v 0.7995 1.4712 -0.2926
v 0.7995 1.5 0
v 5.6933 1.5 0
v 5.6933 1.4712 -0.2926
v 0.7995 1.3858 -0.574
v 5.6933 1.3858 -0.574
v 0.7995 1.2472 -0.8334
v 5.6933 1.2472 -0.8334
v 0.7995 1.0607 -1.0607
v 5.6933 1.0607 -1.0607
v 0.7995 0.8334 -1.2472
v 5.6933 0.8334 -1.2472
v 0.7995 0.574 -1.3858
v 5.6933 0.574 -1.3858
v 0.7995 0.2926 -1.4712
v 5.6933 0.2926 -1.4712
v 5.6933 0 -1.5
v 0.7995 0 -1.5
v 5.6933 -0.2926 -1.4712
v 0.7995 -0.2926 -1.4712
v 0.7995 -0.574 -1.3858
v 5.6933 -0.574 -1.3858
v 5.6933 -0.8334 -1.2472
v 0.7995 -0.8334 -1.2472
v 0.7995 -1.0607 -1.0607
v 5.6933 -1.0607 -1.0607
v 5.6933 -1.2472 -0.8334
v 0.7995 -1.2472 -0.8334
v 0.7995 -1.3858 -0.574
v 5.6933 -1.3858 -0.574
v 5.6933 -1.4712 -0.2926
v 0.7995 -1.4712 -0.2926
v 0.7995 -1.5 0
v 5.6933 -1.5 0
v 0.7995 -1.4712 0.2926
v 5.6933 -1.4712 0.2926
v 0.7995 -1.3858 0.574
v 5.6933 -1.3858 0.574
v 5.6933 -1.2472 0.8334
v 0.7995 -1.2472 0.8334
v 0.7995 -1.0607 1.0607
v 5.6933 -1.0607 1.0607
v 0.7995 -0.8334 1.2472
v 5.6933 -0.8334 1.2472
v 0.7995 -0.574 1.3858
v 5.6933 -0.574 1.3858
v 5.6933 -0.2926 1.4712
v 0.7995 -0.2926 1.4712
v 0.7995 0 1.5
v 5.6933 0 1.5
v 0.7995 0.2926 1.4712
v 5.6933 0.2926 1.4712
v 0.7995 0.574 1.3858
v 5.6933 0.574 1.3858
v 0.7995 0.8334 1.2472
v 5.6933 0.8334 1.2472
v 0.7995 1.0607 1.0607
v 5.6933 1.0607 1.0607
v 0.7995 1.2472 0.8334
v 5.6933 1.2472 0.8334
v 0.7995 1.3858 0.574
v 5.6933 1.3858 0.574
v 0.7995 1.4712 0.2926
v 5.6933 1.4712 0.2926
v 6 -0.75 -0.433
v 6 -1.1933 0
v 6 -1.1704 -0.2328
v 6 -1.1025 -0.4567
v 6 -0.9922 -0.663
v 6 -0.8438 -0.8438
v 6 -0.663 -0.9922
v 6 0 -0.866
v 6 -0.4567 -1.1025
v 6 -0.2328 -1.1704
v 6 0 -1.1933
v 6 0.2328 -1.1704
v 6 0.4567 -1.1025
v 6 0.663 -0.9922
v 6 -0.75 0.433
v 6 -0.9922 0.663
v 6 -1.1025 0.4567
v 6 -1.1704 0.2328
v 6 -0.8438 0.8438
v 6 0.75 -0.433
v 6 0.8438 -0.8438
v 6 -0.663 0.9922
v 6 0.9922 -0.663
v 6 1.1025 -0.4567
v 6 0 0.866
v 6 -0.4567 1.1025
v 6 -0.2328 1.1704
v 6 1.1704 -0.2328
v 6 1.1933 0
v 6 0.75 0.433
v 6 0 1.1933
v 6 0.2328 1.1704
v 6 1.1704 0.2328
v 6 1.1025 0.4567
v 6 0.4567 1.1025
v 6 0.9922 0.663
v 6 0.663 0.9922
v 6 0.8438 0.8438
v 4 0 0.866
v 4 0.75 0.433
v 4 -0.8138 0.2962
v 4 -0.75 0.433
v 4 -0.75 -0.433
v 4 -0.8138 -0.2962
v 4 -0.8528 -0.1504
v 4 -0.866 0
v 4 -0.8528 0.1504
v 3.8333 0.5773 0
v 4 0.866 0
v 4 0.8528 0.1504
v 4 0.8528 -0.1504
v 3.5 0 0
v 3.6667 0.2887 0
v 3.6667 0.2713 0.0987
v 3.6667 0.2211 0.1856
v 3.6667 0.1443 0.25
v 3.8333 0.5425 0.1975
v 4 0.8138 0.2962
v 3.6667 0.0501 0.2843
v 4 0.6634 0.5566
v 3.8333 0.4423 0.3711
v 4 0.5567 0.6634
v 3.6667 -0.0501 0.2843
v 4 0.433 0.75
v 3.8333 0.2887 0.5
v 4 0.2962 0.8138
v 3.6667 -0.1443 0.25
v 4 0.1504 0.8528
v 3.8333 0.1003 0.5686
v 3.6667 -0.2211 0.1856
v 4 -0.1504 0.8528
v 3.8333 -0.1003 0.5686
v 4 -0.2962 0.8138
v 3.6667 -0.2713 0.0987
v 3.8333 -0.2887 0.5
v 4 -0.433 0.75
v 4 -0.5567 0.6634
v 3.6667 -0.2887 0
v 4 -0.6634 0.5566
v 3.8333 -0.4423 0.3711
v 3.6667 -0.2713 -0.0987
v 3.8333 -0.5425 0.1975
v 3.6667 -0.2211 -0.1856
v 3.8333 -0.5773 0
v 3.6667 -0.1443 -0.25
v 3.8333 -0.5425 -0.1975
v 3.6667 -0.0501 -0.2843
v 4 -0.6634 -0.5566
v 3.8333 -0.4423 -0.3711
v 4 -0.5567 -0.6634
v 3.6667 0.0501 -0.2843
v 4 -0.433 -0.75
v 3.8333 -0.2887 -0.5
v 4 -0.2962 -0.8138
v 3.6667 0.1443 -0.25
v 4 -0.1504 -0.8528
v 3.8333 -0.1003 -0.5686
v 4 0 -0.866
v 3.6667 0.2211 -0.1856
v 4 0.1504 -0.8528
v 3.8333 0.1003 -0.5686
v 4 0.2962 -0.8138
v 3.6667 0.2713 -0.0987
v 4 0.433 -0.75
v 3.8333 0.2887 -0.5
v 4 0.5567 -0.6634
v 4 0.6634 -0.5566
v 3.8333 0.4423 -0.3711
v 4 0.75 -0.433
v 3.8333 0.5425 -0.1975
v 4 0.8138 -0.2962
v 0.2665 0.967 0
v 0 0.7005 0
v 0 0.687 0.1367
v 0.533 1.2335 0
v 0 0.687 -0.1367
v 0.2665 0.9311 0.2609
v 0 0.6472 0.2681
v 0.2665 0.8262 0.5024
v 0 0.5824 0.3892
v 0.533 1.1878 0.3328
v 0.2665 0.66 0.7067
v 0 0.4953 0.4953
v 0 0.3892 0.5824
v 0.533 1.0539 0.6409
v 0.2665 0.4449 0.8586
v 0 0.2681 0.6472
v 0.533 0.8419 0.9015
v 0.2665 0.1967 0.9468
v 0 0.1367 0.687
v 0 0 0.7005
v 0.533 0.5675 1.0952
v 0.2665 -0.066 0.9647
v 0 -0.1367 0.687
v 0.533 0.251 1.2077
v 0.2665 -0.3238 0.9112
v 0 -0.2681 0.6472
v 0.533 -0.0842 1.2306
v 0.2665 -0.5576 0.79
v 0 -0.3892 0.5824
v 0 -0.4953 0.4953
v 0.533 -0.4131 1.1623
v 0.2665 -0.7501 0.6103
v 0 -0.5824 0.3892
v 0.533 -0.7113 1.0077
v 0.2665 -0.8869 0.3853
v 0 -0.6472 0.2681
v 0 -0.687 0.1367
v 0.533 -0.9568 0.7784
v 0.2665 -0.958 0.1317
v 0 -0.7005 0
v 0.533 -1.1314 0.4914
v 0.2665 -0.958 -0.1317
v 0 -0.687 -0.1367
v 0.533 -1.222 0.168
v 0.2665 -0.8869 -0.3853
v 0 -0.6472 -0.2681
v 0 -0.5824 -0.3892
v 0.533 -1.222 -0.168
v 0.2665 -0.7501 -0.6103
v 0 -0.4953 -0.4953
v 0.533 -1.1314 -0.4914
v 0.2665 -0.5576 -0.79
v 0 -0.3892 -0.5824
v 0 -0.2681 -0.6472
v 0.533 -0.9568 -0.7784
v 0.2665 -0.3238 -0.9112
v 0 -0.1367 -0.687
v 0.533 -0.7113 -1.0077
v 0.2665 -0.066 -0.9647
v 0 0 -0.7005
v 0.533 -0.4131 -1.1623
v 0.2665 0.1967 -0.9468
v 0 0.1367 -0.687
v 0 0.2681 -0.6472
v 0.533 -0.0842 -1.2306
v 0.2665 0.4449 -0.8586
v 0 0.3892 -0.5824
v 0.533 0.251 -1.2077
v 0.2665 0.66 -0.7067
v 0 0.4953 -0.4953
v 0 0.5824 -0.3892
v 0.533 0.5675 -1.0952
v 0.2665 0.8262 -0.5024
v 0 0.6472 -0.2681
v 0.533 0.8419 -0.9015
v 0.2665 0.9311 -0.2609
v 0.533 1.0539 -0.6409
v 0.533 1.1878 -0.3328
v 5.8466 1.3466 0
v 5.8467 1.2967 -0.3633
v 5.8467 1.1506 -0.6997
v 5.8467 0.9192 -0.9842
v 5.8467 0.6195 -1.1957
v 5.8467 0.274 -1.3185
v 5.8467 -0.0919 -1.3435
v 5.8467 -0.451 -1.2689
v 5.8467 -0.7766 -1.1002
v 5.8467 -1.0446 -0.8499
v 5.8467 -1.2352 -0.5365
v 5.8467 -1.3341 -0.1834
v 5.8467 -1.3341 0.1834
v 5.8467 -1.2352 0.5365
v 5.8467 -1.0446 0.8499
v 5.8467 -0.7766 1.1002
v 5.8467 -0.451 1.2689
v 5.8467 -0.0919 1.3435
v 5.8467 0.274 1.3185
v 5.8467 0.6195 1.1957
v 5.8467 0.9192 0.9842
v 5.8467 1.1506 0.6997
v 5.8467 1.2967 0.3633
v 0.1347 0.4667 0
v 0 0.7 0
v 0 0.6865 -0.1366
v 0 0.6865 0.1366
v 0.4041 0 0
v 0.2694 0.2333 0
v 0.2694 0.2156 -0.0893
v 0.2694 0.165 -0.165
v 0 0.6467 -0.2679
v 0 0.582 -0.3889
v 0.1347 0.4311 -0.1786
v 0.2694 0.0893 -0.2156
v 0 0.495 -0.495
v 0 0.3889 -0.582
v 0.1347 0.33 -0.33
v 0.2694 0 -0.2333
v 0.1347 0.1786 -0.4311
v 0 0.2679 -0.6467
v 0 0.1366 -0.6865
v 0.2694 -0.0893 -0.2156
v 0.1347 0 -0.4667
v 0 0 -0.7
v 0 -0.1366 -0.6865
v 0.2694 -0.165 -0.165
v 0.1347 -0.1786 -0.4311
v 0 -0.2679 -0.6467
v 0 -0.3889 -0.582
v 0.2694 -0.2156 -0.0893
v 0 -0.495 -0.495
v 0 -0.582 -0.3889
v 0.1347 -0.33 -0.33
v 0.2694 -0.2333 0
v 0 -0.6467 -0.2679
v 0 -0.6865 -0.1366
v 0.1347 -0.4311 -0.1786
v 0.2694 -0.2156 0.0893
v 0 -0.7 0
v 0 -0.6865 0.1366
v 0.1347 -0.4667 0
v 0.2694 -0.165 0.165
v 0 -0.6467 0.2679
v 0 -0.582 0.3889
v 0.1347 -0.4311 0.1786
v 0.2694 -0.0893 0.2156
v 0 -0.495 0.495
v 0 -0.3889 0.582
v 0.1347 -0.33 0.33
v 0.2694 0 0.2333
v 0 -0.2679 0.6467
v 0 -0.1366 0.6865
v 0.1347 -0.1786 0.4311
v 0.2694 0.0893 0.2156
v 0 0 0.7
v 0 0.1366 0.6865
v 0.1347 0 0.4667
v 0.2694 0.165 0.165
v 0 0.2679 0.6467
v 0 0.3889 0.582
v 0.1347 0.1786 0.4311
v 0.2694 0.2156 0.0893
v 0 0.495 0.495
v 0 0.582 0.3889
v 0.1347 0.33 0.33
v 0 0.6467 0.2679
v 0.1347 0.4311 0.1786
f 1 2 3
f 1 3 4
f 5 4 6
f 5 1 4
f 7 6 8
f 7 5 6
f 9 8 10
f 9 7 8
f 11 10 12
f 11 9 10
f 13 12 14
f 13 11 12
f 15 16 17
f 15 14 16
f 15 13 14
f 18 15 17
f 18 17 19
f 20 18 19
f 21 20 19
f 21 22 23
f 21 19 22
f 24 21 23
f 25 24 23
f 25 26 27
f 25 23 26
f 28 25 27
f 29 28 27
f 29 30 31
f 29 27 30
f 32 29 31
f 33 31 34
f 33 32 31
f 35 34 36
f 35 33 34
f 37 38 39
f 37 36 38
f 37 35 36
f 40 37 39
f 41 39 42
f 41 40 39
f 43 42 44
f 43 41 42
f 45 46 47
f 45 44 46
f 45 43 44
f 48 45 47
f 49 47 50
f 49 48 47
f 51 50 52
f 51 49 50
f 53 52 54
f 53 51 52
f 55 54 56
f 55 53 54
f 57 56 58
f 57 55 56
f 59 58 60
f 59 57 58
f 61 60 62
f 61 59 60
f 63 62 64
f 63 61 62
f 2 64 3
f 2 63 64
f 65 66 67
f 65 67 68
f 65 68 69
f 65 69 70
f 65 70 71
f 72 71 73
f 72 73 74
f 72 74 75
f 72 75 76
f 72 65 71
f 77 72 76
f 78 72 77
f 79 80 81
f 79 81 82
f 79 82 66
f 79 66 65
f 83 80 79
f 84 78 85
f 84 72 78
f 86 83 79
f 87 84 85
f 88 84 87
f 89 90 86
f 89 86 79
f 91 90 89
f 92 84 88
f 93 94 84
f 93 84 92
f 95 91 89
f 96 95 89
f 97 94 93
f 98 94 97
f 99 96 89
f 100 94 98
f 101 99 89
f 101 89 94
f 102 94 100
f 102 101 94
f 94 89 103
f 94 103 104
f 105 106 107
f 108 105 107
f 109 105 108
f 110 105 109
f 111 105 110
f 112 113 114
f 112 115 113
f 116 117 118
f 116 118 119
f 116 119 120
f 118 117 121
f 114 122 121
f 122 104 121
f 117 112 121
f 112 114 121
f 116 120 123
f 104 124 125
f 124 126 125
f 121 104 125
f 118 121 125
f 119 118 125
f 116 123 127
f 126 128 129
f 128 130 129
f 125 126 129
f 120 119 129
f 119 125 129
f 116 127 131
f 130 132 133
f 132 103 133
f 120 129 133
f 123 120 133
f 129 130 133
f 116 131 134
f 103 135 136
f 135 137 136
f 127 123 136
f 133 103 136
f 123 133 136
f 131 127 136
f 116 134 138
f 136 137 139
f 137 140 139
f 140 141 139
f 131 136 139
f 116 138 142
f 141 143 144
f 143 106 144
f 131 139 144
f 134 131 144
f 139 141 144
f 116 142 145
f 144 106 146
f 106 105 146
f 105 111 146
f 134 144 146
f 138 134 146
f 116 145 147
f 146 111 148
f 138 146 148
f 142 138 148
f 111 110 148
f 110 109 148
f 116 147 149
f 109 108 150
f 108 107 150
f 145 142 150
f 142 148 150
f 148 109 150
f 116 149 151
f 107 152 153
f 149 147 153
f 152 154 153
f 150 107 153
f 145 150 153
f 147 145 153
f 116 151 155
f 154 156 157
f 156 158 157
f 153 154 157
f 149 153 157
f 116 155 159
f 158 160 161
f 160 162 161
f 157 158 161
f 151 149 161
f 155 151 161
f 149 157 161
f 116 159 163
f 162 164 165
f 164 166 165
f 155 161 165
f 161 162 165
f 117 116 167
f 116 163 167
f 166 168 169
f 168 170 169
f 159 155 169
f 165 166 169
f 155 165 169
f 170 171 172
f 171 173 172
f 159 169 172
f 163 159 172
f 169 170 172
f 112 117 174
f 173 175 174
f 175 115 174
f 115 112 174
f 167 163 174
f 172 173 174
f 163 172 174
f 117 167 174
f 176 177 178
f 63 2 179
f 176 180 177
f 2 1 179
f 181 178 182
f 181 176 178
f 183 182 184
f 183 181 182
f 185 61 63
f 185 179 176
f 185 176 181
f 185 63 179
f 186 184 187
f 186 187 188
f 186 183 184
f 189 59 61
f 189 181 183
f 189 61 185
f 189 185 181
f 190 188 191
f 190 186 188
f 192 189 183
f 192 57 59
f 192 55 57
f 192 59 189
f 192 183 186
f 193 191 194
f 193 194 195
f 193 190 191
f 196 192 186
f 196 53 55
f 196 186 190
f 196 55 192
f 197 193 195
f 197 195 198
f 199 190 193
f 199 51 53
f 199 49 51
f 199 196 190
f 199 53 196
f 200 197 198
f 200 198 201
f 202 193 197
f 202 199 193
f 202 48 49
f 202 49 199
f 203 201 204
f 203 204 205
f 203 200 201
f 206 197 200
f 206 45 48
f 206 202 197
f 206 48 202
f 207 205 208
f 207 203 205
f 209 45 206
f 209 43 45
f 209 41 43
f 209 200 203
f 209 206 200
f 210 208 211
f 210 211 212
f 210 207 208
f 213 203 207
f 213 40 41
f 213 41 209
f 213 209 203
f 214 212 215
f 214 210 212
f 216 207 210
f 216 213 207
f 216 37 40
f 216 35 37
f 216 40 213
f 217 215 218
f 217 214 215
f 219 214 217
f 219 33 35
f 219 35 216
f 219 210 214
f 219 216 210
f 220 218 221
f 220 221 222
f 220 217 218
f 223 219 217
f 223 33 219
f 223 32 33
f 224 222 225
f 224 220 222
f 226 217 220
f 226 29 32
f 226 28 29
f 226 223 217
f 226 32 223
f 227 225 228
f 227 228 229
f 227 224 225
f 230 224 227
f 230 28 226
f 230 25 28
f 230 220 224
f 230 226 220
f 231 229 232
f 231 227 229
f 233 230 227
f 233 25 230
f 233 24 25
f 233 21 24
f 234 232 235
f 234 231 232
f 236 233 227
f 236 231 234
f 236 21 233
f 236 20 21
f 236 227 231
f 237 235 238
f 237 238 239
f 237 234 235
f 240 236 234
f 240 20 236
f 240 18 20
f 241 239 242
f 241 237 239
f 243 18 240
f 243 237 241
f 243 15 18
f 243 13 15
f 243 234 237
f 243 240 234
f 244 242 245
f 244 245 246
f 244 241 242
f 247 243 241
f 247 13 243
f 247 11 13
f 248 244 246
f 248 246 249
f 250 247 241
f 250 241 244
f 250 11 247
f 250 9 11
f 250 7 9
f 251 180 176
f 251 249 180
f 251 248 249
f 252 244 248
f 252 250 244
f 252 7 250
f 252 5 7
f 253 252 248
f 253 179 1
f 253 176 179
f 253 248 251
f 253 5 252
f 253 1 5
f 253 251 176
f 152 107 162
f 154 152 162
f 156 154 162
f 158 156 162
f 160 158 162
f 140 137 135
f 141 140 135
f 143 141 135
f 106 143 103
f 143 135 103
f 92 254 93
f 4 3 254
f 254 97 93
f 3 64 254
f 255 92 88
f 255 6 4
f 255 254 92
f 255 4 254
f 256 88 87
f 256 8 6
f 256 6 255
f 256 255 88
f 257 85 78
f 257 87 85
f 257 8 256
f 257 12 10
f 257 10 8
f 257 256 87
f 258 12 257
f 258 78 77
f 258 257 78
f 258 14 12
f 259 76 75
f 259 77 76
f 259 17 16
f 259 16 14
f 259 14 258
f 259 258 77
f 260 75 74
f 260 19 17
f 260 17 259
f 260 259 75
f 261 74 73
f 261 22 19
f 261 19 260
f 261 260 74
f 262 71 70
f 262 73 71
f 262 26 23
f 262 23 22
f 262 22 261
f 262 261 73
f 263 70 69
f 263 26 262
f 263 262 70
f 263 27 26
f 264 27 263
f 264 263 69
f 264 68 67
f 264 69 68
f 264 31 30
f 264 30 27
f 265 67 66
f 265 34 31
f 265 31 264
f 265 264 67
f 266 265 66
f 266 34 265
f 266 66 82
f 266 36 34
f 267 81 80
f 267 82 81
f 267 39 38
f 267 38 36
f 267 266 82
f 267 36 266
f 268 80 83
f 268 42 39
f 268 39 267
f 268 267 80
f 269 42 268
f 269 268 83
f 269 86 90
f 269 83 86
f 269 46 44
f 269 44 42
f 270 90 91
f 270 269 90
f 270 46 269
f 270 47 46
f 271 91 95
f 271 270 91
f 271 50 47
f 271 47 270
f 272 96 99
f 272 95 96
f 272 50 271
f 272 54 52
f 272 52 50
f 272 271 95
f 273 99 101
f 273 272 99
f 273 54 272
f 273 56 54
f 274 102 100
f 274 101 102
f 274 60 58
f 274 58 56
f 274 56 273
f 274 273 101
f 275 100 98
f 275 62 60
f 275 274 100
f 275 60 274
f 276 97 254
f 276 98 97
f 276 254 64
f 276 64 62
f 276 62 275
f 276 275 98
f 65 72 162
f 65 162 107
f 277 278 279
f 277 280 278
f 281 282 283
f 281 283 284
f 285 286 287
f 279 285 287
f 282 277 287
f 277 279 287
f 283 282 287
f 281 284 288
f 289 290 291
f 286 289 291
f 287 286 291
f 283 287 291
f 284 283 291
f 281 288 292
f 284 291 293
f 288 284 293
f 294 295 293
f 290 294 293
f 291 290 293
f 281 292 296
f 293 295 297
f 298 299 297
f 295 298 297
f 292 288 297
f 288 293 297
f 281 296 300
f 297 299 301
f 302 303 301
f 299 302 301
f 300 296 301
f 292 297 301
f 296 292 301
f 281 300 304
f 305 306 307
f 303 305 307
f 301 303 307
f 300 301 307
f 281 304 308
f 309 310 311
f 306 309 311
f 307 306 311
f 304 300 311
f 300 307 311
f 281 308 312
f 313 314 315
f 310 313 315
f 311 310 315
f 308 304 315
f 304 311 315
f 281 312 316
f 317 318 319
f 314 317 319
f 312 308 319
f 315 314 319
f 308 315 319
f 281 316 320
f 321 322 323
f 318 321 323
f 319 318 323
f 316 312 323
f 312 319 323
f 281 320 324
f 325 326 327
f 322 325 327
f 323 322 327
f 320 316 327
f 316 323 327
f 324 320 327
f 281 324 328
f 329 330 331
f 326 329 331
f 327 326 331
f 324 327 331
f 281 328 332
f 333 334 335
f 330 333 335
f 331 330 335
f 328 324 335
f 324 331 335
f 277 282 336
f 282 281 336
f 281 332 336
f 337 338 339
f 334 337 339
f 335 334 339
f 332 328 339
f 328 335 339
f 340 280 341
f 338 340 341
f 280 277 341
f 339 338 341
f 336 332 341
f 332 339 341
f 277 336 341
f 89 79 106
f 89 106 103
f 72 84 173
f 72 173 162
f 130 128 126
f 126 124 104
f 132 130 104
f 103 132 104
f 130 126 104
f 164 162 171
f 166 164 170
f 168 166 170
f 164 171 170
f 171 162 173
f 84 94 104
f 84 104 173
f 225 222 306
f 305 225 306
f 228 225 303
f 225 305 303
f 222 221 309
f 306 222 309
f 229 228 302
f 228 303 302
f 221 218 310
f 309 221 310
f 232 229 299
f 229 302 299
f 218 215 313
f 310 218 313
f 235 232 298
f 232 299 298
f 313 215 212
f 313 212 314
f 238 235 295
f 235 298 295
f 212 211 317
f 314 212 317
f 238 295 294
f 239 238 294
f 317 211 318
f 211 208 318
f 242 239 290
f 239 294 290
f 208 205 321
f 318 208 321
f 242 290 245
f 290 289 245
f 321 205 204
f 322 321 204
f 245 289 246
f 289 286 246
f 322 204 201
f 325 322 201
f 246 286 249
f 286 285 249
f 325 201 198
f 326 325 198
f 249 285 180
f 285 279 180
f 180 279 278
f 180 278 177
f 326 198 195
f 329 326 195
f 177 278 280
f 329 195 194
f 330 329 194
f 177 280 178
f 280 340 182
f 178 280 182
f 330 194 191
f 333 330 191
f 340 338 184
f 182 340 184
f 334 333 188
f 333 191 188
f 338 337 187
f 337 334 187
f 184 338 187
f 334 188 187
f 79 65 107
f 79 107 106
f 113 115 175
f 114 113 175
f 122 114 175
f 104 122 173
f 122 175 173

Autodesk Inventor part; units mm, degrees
ref_plane "YZ Plane" through (0, 0, 0) normal (1, 0, 0) x (0, 1, 0)
ref_plane "XZ Plane" through (0, 0, 0) normal (0, 1, 0) x (-1, 0, 0)
sketch "Náčrt1" plane through (0, 0, 0) normal (0, 0, 1) x (1, 0, 0)
  line L0 (0.4041, 0) -> (3.5, 0)
  line L1 (6, 0.866) -> (6, 1.5)
  line L2 (6, 1.5) -> (0, 1.5)
  line L3 (6, 0.866) -> (4, 0.866)
  line L4 (4, 0.866) -> (3.5, 0)
  line L5 (0, 0.7) -> (0.4041, 0)
  line L6 (0, -0.3) -> (0, 1.8) projected
  line L7 (0, 0.7) -> (0, 1.5)
  point P0 (0, 0)
  dimension "d0" = 2
  dimension "d1" = 60
  dimension "d2" = 3
  dimension "d3" = 1.7321
  dimension "d4" = 6
  dimension "d5" = 60
  dimension "d7" = 1.4
revolve "Těleso" add sketch "Náčrt1" angle 360 about axis through (0.4041, 0, 0) along (1, 0, 0)
sketch "Náčrt2" plane through (6, 0, 0) normal (1, 0, 0) x (0, 0, -1)
  circle A0 centre (0, 0) radius 0.866 projected
  circle A1 centre (0, 0) radius 1.5 projected
  line L0 (0.866, 0) -> (0.433, -0.75)
  line L1 (0.433, -0.75) -> (-0.433, -0.75)
  line L2 (-0.433, -0.75) -> (-0.866, 0)
  line L3 (-0.866, 0) -> (-0.433, 0.75)
  line L4 (-0.433, 0.75) -> (0.433, 0.75)
  line L5 (0.433, 0.75) -> (0.866, 0)
extrude "Drážka" add sketch "Náčrt2" against normal blind 2 contours L5 A0 | A0 L0 | L4 A0 | A0 L1 | L3 A0 | A0 L2
chamfer "Zkosení1" distance 0.8 angle 45 1 edges at (0, -1.5, 0) measured on face at (0, 1.2188, -0.1197)
thread "Závit" size "M3x0.5" class "6g" standard "ISO Metric profile" length 6
chamfer "Zkosení2" distance 0.3067 angle 45 1 edges at (6, -1.5, 0) measured on face at (2.533, 1.4951, -0.1207)
ref_plane "Work Plane1" through (3, 0, 0) normal (0, -0.5, -0.866) x (1, 0, 0)
equation "\"d8\" = INTI"
equation "\"d10\" = -0.5 * SPD + 0.5 * NND"
equation "\"d11\" = FAWI1"
equation "\"d33\" = -0.5 * SPD + 0.5 * NND"
equation "\"d14\" = NLG"
equation "\"d12\" = -0.5 * GD1 + 0.5 * NND"
equation "\"d13\" = FAWI"
equation "\"d34\" = -0.5 * GD1 + 0.5 * NND"
equation "\"d0\" = INTI"
equation "\"d2\" = NND"
equation "\"d3\" = 1.1547 * SW"
equation "\"d4\" = NLG"
equation "\"d5\" = 0.5 * ANG"
equation "\"d7\" = SPD"
equation "\"NND\" = 3"
equation "\"NLG\" = 6"
equation "\"INTI\" = 2"
equation "\"FAWI\" = 45deg"
equation "\"SW\" = 1.5"
equation "\"GD1\" = THREADDIA - 1.2269 * PTC"
equation "\"ANG\" = 120deg"
equation "\"FAWI1\" = 45deg"
equation "\"SPD\" = 1.4"
equation "\"GUL\" = 0.61345 * PTC"
equation "\"TOA\" = 30deg"
equation "\"THREADDIA\" = 3"
equation "\"PTC\" = 0.5"
equation "\"GAL\" = 0.61345 * PTC"
equation "\"E0\" = 1.155 * SW"
properties part number "DIN 916 - M3  x  6" material "Ocel, měkká"
